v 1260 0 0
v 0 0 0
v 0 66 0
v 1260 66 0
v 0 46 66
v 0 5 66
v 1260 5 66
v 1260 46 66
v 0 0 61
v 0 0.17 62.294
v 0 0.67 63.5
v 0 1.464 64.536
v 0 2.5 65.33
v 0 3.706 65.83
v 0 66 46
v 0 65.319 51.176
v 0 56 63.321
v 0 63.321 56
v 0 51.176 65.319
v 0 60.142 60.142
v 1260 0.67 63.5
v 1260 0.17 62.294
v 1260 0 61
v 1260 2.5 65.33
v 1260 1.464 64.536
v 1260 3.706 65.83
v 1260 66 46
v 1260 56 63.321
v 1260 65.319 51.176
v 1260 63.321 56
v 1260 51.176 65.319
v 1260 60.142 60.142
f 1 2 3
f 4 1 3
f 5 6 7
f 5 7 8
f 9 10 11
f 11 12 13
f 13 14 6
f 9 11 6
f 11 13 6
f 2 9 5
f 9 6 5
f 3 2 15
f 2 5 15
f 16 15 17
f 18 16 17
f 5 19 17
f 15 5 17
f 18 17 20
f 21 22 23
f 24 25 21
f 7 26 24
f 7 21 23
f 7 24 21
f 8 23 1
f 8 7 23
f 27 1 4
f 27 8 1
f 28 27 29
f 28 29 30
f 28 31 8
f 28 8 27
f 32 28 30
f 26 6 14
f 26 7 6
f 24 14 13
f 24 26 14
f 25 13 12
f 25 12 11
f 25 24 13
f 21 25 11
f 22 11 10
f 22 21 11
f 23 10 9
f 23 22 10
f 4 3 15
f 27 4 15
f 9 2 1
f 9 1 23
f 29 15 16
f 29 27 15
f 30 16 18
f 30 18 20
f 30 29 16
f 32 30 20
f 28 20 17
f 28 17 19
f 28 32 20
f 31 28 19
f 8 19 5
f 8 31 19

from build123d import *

# Parameters (mm, degrees)
F0_W     = 66
F0_H     = 66
F1_DEPTH = 1260
F2_R     = 20
F3_R     = 5


with BuildPart() as f1:
    # F0 (on Right) → F1 (new body)
    with BuildSketch(Plane.YZ):
        with Locations((33, 33)):
            Rectangle(F0_W, F0_H)
    extrude(amount=F1_DEPTH)

    # F2
    f2_edges = [f1.edges().sort_by_distance(p)[0] for p in [
        (630, 66, 66),
    ]]
    fillet(f2_edges, radius=F2_R)

    # F3
    f3_edges = [f1.edges().sort_by_distance(p)[0] for p in [
        (630, 0, 66),
    ]]
    fillet(f3_edges, radius=F3_R)


solid = f1.part
